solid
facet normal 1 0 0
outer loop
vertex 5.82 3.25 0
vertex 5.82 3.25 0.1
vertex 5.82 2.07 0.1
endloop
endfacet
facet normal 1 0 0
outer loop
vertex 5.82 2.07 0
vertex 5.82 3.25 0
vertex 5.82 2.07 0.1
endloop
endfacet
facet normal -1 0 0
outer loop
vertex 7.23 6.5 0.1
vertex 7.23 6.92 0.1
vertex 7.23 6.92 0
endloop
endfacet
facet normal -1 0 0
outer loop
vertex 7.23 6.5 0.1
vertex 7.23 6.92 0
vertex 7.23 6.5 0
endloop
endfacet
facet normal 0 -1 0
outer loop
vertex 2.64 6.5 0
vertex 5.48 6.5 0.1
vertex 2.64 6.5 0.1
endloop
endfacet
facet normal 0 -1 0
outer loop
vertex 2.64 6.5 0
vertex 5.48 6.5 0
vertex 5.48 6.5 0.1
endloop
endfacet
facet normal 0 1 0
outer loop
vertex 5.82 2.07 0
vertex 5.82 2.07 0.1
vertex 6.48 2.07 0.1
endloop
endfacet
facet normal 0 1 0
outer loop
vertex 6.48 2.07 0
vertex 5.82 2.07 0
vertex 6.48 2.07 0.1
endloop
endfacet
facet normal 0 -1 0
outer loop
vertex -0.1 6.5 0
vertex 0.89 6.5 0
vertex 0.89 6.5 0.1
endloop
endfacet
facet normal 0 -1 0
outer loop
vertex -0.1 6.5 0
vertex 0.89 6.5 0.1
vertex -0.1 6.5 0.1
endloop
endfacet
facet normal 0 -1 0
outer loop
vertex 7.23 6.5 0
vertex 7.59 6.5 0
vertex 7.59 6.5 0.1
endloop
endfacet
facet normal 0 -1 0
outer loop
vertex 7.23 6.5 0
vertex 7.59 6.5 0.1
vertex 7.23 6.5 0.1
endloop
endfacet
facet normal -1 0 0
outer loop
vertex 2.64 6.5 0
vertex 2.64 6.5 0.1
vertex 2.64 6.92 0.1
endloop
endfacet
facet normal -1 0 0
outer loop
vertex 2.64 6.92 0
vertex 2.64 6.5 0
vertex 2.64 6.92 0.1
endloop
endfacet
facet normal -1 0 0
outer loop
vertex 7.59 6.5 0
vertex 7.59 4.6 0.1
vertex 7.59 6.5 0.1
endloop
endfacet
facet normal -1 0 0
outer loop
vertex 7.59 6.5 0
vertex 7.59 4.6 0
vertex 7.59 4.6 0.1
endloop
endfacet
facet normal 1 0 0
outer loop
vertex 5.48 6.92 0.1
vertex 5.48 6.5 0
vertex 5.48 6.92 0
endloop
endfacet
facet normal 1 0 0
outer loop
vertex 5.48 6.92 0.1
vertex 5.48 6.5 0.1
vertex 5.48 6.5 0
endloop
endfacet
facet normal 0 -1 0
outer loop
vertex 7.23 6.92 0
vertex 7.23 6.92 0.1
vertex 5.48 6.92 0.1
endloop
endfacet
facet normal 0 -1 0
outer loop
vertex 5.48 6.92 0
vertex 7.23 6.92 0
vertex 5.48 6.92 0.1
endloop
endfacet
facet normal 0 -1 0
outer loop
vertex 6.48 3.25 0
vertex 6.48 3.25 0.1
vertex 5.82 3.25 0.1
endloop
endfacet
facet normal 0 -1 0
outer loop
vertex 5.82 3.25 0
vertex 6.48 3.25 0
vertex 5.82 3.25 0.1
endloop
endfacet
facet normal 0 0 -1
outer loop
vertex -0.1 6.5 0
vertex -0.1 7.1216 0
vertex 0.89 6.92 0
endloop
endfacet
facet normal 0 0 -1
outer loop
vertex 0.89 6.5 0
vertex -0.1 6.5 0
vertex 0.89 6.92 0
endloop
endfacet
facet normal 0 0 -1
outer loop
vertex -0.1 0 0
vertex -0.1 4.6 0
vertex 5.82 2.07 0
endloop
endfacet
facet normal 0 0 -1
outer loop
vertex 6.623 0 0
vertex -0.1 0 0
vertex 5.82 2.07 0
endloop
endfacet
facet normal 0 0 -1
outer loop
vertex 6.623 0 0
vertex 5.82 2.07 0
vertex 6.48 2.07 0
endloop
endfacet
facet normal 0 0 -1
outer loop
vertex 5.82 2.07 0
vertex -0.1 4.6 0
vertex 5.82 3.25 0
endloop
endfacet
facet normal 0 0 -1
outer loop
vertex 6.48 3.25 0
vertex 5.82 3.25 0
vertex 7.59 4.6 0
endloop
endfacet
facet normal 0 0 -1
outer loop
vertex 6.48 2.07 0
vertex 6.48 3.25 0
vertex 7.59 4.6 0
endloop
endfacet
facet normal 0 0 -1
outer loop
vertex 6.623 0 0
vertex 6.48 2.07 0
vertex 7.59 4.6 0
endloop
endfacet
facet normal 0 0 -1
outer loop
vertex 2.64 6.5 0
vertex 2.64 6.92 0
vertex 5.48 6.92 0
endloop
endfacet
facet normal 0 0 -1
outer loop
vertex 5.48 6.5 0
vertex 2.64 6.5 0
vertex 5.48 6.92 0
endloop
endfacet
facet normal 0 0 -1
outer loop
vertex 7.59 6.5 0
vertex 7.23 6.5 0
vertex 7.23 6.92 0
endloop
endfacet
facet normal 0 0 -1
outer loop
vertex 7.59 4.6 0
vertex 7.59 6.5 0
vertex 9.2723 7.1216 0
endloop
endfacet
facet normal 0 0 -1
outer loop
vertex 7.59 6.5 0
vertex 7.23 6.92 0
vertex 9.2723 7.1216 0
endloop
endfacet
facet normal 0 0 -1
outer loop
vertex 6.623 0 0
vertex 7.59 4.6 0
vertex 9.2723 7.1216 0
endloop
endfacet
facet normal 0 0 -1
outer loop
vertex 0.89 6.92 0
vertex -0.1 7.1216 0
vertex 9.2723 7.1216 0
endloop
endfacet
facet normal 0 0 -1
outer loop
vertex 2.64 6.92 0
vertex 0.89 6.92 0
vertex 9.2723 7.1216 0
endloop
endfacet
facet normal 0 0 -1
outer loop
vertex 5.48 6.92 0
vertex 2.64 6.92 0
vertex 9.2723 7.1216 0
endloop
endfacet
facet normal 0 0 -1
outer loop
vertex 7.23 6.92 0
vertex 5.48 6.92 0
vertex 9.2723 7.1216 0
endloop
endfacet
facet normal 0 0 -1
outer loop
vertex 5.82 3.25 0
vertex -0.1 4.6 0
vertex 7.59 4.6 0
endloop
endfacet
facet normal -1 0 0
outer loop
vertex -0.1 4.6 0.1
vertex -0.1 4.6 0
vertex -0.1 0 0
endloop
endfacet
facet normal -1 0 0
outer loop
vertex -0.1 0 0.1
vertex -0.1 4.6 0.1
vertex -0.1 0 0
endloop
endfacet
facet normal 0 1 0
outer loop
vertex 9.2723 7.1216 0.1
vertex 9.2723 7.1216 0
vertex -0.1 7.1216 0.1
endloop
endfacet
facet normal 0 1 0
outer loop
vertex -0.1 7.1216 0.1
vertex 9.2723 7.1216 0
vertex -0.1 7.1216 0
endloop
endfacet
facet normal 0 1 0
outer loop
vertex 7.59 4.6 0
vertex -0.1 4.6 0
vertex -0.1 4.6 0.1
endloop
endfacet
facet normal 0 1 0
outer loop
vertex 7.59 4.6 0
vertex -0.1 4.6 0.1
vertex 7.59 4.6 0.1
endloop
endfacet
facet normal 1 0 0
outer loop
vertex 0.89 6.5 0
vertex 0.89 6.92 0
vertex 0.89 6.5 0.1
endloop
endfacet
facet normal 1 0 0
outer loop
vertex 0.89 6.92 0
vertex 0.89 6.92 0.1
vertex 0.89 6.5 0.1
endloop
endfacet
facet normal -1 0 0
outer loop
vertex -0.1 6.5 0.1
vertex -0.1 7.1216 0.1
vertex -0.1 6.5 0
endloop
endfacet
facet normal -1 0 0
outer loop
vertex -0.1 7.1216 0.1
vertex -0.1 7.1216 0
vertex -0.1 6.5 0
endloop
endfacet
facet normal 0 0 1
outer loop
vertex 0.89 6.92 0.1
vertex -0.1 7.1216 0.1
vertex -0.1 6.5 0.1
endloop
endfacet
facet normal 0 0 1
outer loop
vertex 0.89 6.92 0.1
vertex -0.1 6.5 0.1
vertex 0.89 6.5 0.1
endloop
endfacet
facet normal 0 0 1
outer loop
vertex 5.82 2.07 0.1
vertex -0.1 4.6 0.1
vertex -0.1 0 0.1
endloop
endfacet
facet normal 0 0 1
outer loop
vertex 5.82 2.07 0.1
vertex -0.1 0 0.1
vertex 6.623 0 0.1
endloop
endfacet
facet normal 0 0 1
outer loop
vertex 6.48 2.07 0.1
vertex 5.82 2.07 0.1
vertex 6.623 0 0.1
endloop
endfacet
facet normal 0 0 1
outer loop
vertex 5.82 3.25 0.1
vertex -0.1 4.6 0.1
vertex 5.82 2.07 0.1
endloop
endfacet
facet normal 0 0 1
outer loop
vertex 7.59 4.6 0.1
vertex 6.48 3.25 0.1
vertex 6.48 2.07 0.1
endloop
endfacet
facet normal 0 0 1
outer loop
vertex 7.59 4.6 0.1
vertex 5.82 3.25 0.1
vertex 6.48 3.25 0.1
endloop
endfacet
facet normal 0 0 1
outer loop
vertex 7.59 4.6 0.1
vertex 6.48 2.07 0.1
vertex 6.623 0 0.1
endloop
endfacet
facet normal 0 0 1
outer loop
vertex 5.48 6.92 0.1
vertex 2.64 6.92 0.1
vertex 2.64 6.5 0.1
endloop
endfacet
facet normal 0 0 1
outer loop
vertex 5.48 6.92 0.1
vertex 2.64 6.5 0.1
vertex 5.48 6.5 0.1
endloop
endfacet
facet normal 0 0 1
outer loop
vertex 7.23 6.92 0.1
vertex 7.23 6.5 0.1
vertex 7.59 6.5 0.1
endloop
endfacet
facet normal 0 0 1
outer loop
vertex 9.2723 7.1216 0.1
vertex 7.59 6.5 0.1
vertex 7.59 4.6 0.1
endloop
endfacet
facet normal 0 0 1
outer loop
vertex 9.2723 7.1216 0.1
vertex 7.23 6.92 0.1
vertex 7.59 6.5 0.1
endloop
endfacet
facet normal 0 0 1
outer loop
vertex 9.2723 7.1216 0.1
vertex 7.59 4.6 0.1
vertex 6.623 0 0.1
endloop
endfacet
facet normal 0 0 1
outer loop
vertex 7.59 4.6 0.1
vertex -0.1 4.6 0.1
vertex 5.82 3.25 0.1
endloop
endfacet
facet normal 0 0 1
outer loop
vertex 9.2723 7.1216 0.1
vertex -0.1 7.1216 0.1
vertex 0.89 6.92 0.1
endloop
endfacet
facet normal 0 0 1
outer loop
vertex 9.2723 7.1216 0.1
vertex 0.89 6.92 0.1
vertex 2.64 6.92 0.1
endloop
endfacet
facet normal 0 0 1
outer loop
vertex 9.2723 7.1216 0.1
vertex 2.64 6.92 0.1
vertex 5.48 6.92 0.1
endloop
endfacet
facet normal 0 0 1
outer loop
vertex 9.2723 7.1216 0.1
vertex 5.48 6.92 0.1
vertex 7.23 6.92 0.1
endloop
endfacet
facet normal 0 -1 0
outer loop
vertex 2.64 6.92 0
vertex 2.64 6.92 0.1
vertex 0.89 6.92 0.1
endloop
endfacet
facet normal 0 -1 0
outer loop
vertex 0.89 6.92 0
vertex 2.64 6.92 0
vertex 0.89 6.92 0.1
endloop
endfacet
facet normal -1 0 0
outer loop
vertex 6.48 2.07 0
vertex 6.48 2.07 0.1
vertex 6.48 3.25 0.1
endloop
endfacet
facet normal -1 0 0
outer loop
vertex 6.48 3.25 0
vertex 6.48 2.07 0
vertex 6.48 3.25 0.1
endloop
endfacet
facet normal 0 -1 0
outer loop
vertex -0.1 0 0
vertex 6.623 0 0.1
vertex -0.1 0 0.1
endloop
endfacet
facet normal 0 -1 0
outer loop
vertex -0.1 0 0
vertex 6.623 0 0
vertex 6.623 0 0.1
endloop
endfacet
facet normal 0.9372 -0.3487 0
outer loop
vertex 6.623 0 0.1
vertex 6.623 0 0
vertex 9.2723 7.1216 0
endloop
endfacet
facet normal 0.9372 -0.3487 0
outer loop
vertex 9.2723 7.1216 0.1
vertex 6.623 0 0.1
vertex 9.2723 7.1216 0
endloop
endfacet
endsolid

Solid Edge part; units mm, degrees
sketch "Sketch1" plane through (0, 0, 0) normal (0, 0, 1) x (1, 0, 0)
  line L0 (-0.1, 4.6) -> (-0.1, 0)
  line L1 (6.623, 0) -> (-0.1, 0)
  line L2 (6.623, 0) -> (9.2723, 7.1216)
  line L3 (9.2723, 7.1216) -> (-0.1, 7.1216)
  line L4 (-0.1, 7.1216) -> (-0.1, 6.5)
  line L5 (7.59, 6.5) -> (-0.1, 6.5)
  line L6 (7.59, 4.6) -> (7.59, 6.5)
  line L7 (-0.1, 4.6) -> (7.59, 4.6)
  dimension "D1" = 4.6
  dimension "D2" = 7.69
  dimension "D3" = 1.9
extrude "Protrusion1" add sketch "Sketch1" along normal blind 0.1
sketch "Sketch2" plane through (4.6037, 3.5608, 0.1) normal (0, 0, 1) x (-1, 0, 0)
  line L0 (-1.8763, 0.3108) -> (-1.2163, 0.3108)
  line L1 (-1.2163, 0.3108) -> (-1.2163, 1.4908)
  line L2 (-1.2163, 1.4908) -> (-1.8763, 1.4908)
  line L3 (-1.8763, 1.4908) -> (-1.8763, 0.3108)
  dimension "D1" = 1.2163
  dimension "D2" = 1.8763
  dimension "D3" = 1.2163
extrude "Cutout1" cut sketch "Sketch2" against normal through all
sketch "Sketch3" plane through (4.5862, 3.5608, 0.1) normal (0, 0, 1) x (-1, 0, 0)
  line L0 (-0.8938, -2.9392) -> (-2.6438, -2.9392)
  line L1 (-2.6438, -3.3592) -> (-2.6438, -2.9392)
  line L2 (-2.6438, -3.3592) -> (-0.8938, -3.3592)
  line L3 (-0.8938, -2.9392) -> (-0.8938, -3.3592)
  line L4 (1.9462, -2.9392) -> (1.9462, -3.3592)
  line L5 (1.9462, -3.3592) -> (3.6962, -3.3592)
  line L6 (3.6962, -3.3592) -> (3.6962, -2.9392)
  line L7 (3.6962, -2.9392) -> (1.9462, -2.9392)
extrude "Cutout2" cut sketch "Sketch3" against normal through all
